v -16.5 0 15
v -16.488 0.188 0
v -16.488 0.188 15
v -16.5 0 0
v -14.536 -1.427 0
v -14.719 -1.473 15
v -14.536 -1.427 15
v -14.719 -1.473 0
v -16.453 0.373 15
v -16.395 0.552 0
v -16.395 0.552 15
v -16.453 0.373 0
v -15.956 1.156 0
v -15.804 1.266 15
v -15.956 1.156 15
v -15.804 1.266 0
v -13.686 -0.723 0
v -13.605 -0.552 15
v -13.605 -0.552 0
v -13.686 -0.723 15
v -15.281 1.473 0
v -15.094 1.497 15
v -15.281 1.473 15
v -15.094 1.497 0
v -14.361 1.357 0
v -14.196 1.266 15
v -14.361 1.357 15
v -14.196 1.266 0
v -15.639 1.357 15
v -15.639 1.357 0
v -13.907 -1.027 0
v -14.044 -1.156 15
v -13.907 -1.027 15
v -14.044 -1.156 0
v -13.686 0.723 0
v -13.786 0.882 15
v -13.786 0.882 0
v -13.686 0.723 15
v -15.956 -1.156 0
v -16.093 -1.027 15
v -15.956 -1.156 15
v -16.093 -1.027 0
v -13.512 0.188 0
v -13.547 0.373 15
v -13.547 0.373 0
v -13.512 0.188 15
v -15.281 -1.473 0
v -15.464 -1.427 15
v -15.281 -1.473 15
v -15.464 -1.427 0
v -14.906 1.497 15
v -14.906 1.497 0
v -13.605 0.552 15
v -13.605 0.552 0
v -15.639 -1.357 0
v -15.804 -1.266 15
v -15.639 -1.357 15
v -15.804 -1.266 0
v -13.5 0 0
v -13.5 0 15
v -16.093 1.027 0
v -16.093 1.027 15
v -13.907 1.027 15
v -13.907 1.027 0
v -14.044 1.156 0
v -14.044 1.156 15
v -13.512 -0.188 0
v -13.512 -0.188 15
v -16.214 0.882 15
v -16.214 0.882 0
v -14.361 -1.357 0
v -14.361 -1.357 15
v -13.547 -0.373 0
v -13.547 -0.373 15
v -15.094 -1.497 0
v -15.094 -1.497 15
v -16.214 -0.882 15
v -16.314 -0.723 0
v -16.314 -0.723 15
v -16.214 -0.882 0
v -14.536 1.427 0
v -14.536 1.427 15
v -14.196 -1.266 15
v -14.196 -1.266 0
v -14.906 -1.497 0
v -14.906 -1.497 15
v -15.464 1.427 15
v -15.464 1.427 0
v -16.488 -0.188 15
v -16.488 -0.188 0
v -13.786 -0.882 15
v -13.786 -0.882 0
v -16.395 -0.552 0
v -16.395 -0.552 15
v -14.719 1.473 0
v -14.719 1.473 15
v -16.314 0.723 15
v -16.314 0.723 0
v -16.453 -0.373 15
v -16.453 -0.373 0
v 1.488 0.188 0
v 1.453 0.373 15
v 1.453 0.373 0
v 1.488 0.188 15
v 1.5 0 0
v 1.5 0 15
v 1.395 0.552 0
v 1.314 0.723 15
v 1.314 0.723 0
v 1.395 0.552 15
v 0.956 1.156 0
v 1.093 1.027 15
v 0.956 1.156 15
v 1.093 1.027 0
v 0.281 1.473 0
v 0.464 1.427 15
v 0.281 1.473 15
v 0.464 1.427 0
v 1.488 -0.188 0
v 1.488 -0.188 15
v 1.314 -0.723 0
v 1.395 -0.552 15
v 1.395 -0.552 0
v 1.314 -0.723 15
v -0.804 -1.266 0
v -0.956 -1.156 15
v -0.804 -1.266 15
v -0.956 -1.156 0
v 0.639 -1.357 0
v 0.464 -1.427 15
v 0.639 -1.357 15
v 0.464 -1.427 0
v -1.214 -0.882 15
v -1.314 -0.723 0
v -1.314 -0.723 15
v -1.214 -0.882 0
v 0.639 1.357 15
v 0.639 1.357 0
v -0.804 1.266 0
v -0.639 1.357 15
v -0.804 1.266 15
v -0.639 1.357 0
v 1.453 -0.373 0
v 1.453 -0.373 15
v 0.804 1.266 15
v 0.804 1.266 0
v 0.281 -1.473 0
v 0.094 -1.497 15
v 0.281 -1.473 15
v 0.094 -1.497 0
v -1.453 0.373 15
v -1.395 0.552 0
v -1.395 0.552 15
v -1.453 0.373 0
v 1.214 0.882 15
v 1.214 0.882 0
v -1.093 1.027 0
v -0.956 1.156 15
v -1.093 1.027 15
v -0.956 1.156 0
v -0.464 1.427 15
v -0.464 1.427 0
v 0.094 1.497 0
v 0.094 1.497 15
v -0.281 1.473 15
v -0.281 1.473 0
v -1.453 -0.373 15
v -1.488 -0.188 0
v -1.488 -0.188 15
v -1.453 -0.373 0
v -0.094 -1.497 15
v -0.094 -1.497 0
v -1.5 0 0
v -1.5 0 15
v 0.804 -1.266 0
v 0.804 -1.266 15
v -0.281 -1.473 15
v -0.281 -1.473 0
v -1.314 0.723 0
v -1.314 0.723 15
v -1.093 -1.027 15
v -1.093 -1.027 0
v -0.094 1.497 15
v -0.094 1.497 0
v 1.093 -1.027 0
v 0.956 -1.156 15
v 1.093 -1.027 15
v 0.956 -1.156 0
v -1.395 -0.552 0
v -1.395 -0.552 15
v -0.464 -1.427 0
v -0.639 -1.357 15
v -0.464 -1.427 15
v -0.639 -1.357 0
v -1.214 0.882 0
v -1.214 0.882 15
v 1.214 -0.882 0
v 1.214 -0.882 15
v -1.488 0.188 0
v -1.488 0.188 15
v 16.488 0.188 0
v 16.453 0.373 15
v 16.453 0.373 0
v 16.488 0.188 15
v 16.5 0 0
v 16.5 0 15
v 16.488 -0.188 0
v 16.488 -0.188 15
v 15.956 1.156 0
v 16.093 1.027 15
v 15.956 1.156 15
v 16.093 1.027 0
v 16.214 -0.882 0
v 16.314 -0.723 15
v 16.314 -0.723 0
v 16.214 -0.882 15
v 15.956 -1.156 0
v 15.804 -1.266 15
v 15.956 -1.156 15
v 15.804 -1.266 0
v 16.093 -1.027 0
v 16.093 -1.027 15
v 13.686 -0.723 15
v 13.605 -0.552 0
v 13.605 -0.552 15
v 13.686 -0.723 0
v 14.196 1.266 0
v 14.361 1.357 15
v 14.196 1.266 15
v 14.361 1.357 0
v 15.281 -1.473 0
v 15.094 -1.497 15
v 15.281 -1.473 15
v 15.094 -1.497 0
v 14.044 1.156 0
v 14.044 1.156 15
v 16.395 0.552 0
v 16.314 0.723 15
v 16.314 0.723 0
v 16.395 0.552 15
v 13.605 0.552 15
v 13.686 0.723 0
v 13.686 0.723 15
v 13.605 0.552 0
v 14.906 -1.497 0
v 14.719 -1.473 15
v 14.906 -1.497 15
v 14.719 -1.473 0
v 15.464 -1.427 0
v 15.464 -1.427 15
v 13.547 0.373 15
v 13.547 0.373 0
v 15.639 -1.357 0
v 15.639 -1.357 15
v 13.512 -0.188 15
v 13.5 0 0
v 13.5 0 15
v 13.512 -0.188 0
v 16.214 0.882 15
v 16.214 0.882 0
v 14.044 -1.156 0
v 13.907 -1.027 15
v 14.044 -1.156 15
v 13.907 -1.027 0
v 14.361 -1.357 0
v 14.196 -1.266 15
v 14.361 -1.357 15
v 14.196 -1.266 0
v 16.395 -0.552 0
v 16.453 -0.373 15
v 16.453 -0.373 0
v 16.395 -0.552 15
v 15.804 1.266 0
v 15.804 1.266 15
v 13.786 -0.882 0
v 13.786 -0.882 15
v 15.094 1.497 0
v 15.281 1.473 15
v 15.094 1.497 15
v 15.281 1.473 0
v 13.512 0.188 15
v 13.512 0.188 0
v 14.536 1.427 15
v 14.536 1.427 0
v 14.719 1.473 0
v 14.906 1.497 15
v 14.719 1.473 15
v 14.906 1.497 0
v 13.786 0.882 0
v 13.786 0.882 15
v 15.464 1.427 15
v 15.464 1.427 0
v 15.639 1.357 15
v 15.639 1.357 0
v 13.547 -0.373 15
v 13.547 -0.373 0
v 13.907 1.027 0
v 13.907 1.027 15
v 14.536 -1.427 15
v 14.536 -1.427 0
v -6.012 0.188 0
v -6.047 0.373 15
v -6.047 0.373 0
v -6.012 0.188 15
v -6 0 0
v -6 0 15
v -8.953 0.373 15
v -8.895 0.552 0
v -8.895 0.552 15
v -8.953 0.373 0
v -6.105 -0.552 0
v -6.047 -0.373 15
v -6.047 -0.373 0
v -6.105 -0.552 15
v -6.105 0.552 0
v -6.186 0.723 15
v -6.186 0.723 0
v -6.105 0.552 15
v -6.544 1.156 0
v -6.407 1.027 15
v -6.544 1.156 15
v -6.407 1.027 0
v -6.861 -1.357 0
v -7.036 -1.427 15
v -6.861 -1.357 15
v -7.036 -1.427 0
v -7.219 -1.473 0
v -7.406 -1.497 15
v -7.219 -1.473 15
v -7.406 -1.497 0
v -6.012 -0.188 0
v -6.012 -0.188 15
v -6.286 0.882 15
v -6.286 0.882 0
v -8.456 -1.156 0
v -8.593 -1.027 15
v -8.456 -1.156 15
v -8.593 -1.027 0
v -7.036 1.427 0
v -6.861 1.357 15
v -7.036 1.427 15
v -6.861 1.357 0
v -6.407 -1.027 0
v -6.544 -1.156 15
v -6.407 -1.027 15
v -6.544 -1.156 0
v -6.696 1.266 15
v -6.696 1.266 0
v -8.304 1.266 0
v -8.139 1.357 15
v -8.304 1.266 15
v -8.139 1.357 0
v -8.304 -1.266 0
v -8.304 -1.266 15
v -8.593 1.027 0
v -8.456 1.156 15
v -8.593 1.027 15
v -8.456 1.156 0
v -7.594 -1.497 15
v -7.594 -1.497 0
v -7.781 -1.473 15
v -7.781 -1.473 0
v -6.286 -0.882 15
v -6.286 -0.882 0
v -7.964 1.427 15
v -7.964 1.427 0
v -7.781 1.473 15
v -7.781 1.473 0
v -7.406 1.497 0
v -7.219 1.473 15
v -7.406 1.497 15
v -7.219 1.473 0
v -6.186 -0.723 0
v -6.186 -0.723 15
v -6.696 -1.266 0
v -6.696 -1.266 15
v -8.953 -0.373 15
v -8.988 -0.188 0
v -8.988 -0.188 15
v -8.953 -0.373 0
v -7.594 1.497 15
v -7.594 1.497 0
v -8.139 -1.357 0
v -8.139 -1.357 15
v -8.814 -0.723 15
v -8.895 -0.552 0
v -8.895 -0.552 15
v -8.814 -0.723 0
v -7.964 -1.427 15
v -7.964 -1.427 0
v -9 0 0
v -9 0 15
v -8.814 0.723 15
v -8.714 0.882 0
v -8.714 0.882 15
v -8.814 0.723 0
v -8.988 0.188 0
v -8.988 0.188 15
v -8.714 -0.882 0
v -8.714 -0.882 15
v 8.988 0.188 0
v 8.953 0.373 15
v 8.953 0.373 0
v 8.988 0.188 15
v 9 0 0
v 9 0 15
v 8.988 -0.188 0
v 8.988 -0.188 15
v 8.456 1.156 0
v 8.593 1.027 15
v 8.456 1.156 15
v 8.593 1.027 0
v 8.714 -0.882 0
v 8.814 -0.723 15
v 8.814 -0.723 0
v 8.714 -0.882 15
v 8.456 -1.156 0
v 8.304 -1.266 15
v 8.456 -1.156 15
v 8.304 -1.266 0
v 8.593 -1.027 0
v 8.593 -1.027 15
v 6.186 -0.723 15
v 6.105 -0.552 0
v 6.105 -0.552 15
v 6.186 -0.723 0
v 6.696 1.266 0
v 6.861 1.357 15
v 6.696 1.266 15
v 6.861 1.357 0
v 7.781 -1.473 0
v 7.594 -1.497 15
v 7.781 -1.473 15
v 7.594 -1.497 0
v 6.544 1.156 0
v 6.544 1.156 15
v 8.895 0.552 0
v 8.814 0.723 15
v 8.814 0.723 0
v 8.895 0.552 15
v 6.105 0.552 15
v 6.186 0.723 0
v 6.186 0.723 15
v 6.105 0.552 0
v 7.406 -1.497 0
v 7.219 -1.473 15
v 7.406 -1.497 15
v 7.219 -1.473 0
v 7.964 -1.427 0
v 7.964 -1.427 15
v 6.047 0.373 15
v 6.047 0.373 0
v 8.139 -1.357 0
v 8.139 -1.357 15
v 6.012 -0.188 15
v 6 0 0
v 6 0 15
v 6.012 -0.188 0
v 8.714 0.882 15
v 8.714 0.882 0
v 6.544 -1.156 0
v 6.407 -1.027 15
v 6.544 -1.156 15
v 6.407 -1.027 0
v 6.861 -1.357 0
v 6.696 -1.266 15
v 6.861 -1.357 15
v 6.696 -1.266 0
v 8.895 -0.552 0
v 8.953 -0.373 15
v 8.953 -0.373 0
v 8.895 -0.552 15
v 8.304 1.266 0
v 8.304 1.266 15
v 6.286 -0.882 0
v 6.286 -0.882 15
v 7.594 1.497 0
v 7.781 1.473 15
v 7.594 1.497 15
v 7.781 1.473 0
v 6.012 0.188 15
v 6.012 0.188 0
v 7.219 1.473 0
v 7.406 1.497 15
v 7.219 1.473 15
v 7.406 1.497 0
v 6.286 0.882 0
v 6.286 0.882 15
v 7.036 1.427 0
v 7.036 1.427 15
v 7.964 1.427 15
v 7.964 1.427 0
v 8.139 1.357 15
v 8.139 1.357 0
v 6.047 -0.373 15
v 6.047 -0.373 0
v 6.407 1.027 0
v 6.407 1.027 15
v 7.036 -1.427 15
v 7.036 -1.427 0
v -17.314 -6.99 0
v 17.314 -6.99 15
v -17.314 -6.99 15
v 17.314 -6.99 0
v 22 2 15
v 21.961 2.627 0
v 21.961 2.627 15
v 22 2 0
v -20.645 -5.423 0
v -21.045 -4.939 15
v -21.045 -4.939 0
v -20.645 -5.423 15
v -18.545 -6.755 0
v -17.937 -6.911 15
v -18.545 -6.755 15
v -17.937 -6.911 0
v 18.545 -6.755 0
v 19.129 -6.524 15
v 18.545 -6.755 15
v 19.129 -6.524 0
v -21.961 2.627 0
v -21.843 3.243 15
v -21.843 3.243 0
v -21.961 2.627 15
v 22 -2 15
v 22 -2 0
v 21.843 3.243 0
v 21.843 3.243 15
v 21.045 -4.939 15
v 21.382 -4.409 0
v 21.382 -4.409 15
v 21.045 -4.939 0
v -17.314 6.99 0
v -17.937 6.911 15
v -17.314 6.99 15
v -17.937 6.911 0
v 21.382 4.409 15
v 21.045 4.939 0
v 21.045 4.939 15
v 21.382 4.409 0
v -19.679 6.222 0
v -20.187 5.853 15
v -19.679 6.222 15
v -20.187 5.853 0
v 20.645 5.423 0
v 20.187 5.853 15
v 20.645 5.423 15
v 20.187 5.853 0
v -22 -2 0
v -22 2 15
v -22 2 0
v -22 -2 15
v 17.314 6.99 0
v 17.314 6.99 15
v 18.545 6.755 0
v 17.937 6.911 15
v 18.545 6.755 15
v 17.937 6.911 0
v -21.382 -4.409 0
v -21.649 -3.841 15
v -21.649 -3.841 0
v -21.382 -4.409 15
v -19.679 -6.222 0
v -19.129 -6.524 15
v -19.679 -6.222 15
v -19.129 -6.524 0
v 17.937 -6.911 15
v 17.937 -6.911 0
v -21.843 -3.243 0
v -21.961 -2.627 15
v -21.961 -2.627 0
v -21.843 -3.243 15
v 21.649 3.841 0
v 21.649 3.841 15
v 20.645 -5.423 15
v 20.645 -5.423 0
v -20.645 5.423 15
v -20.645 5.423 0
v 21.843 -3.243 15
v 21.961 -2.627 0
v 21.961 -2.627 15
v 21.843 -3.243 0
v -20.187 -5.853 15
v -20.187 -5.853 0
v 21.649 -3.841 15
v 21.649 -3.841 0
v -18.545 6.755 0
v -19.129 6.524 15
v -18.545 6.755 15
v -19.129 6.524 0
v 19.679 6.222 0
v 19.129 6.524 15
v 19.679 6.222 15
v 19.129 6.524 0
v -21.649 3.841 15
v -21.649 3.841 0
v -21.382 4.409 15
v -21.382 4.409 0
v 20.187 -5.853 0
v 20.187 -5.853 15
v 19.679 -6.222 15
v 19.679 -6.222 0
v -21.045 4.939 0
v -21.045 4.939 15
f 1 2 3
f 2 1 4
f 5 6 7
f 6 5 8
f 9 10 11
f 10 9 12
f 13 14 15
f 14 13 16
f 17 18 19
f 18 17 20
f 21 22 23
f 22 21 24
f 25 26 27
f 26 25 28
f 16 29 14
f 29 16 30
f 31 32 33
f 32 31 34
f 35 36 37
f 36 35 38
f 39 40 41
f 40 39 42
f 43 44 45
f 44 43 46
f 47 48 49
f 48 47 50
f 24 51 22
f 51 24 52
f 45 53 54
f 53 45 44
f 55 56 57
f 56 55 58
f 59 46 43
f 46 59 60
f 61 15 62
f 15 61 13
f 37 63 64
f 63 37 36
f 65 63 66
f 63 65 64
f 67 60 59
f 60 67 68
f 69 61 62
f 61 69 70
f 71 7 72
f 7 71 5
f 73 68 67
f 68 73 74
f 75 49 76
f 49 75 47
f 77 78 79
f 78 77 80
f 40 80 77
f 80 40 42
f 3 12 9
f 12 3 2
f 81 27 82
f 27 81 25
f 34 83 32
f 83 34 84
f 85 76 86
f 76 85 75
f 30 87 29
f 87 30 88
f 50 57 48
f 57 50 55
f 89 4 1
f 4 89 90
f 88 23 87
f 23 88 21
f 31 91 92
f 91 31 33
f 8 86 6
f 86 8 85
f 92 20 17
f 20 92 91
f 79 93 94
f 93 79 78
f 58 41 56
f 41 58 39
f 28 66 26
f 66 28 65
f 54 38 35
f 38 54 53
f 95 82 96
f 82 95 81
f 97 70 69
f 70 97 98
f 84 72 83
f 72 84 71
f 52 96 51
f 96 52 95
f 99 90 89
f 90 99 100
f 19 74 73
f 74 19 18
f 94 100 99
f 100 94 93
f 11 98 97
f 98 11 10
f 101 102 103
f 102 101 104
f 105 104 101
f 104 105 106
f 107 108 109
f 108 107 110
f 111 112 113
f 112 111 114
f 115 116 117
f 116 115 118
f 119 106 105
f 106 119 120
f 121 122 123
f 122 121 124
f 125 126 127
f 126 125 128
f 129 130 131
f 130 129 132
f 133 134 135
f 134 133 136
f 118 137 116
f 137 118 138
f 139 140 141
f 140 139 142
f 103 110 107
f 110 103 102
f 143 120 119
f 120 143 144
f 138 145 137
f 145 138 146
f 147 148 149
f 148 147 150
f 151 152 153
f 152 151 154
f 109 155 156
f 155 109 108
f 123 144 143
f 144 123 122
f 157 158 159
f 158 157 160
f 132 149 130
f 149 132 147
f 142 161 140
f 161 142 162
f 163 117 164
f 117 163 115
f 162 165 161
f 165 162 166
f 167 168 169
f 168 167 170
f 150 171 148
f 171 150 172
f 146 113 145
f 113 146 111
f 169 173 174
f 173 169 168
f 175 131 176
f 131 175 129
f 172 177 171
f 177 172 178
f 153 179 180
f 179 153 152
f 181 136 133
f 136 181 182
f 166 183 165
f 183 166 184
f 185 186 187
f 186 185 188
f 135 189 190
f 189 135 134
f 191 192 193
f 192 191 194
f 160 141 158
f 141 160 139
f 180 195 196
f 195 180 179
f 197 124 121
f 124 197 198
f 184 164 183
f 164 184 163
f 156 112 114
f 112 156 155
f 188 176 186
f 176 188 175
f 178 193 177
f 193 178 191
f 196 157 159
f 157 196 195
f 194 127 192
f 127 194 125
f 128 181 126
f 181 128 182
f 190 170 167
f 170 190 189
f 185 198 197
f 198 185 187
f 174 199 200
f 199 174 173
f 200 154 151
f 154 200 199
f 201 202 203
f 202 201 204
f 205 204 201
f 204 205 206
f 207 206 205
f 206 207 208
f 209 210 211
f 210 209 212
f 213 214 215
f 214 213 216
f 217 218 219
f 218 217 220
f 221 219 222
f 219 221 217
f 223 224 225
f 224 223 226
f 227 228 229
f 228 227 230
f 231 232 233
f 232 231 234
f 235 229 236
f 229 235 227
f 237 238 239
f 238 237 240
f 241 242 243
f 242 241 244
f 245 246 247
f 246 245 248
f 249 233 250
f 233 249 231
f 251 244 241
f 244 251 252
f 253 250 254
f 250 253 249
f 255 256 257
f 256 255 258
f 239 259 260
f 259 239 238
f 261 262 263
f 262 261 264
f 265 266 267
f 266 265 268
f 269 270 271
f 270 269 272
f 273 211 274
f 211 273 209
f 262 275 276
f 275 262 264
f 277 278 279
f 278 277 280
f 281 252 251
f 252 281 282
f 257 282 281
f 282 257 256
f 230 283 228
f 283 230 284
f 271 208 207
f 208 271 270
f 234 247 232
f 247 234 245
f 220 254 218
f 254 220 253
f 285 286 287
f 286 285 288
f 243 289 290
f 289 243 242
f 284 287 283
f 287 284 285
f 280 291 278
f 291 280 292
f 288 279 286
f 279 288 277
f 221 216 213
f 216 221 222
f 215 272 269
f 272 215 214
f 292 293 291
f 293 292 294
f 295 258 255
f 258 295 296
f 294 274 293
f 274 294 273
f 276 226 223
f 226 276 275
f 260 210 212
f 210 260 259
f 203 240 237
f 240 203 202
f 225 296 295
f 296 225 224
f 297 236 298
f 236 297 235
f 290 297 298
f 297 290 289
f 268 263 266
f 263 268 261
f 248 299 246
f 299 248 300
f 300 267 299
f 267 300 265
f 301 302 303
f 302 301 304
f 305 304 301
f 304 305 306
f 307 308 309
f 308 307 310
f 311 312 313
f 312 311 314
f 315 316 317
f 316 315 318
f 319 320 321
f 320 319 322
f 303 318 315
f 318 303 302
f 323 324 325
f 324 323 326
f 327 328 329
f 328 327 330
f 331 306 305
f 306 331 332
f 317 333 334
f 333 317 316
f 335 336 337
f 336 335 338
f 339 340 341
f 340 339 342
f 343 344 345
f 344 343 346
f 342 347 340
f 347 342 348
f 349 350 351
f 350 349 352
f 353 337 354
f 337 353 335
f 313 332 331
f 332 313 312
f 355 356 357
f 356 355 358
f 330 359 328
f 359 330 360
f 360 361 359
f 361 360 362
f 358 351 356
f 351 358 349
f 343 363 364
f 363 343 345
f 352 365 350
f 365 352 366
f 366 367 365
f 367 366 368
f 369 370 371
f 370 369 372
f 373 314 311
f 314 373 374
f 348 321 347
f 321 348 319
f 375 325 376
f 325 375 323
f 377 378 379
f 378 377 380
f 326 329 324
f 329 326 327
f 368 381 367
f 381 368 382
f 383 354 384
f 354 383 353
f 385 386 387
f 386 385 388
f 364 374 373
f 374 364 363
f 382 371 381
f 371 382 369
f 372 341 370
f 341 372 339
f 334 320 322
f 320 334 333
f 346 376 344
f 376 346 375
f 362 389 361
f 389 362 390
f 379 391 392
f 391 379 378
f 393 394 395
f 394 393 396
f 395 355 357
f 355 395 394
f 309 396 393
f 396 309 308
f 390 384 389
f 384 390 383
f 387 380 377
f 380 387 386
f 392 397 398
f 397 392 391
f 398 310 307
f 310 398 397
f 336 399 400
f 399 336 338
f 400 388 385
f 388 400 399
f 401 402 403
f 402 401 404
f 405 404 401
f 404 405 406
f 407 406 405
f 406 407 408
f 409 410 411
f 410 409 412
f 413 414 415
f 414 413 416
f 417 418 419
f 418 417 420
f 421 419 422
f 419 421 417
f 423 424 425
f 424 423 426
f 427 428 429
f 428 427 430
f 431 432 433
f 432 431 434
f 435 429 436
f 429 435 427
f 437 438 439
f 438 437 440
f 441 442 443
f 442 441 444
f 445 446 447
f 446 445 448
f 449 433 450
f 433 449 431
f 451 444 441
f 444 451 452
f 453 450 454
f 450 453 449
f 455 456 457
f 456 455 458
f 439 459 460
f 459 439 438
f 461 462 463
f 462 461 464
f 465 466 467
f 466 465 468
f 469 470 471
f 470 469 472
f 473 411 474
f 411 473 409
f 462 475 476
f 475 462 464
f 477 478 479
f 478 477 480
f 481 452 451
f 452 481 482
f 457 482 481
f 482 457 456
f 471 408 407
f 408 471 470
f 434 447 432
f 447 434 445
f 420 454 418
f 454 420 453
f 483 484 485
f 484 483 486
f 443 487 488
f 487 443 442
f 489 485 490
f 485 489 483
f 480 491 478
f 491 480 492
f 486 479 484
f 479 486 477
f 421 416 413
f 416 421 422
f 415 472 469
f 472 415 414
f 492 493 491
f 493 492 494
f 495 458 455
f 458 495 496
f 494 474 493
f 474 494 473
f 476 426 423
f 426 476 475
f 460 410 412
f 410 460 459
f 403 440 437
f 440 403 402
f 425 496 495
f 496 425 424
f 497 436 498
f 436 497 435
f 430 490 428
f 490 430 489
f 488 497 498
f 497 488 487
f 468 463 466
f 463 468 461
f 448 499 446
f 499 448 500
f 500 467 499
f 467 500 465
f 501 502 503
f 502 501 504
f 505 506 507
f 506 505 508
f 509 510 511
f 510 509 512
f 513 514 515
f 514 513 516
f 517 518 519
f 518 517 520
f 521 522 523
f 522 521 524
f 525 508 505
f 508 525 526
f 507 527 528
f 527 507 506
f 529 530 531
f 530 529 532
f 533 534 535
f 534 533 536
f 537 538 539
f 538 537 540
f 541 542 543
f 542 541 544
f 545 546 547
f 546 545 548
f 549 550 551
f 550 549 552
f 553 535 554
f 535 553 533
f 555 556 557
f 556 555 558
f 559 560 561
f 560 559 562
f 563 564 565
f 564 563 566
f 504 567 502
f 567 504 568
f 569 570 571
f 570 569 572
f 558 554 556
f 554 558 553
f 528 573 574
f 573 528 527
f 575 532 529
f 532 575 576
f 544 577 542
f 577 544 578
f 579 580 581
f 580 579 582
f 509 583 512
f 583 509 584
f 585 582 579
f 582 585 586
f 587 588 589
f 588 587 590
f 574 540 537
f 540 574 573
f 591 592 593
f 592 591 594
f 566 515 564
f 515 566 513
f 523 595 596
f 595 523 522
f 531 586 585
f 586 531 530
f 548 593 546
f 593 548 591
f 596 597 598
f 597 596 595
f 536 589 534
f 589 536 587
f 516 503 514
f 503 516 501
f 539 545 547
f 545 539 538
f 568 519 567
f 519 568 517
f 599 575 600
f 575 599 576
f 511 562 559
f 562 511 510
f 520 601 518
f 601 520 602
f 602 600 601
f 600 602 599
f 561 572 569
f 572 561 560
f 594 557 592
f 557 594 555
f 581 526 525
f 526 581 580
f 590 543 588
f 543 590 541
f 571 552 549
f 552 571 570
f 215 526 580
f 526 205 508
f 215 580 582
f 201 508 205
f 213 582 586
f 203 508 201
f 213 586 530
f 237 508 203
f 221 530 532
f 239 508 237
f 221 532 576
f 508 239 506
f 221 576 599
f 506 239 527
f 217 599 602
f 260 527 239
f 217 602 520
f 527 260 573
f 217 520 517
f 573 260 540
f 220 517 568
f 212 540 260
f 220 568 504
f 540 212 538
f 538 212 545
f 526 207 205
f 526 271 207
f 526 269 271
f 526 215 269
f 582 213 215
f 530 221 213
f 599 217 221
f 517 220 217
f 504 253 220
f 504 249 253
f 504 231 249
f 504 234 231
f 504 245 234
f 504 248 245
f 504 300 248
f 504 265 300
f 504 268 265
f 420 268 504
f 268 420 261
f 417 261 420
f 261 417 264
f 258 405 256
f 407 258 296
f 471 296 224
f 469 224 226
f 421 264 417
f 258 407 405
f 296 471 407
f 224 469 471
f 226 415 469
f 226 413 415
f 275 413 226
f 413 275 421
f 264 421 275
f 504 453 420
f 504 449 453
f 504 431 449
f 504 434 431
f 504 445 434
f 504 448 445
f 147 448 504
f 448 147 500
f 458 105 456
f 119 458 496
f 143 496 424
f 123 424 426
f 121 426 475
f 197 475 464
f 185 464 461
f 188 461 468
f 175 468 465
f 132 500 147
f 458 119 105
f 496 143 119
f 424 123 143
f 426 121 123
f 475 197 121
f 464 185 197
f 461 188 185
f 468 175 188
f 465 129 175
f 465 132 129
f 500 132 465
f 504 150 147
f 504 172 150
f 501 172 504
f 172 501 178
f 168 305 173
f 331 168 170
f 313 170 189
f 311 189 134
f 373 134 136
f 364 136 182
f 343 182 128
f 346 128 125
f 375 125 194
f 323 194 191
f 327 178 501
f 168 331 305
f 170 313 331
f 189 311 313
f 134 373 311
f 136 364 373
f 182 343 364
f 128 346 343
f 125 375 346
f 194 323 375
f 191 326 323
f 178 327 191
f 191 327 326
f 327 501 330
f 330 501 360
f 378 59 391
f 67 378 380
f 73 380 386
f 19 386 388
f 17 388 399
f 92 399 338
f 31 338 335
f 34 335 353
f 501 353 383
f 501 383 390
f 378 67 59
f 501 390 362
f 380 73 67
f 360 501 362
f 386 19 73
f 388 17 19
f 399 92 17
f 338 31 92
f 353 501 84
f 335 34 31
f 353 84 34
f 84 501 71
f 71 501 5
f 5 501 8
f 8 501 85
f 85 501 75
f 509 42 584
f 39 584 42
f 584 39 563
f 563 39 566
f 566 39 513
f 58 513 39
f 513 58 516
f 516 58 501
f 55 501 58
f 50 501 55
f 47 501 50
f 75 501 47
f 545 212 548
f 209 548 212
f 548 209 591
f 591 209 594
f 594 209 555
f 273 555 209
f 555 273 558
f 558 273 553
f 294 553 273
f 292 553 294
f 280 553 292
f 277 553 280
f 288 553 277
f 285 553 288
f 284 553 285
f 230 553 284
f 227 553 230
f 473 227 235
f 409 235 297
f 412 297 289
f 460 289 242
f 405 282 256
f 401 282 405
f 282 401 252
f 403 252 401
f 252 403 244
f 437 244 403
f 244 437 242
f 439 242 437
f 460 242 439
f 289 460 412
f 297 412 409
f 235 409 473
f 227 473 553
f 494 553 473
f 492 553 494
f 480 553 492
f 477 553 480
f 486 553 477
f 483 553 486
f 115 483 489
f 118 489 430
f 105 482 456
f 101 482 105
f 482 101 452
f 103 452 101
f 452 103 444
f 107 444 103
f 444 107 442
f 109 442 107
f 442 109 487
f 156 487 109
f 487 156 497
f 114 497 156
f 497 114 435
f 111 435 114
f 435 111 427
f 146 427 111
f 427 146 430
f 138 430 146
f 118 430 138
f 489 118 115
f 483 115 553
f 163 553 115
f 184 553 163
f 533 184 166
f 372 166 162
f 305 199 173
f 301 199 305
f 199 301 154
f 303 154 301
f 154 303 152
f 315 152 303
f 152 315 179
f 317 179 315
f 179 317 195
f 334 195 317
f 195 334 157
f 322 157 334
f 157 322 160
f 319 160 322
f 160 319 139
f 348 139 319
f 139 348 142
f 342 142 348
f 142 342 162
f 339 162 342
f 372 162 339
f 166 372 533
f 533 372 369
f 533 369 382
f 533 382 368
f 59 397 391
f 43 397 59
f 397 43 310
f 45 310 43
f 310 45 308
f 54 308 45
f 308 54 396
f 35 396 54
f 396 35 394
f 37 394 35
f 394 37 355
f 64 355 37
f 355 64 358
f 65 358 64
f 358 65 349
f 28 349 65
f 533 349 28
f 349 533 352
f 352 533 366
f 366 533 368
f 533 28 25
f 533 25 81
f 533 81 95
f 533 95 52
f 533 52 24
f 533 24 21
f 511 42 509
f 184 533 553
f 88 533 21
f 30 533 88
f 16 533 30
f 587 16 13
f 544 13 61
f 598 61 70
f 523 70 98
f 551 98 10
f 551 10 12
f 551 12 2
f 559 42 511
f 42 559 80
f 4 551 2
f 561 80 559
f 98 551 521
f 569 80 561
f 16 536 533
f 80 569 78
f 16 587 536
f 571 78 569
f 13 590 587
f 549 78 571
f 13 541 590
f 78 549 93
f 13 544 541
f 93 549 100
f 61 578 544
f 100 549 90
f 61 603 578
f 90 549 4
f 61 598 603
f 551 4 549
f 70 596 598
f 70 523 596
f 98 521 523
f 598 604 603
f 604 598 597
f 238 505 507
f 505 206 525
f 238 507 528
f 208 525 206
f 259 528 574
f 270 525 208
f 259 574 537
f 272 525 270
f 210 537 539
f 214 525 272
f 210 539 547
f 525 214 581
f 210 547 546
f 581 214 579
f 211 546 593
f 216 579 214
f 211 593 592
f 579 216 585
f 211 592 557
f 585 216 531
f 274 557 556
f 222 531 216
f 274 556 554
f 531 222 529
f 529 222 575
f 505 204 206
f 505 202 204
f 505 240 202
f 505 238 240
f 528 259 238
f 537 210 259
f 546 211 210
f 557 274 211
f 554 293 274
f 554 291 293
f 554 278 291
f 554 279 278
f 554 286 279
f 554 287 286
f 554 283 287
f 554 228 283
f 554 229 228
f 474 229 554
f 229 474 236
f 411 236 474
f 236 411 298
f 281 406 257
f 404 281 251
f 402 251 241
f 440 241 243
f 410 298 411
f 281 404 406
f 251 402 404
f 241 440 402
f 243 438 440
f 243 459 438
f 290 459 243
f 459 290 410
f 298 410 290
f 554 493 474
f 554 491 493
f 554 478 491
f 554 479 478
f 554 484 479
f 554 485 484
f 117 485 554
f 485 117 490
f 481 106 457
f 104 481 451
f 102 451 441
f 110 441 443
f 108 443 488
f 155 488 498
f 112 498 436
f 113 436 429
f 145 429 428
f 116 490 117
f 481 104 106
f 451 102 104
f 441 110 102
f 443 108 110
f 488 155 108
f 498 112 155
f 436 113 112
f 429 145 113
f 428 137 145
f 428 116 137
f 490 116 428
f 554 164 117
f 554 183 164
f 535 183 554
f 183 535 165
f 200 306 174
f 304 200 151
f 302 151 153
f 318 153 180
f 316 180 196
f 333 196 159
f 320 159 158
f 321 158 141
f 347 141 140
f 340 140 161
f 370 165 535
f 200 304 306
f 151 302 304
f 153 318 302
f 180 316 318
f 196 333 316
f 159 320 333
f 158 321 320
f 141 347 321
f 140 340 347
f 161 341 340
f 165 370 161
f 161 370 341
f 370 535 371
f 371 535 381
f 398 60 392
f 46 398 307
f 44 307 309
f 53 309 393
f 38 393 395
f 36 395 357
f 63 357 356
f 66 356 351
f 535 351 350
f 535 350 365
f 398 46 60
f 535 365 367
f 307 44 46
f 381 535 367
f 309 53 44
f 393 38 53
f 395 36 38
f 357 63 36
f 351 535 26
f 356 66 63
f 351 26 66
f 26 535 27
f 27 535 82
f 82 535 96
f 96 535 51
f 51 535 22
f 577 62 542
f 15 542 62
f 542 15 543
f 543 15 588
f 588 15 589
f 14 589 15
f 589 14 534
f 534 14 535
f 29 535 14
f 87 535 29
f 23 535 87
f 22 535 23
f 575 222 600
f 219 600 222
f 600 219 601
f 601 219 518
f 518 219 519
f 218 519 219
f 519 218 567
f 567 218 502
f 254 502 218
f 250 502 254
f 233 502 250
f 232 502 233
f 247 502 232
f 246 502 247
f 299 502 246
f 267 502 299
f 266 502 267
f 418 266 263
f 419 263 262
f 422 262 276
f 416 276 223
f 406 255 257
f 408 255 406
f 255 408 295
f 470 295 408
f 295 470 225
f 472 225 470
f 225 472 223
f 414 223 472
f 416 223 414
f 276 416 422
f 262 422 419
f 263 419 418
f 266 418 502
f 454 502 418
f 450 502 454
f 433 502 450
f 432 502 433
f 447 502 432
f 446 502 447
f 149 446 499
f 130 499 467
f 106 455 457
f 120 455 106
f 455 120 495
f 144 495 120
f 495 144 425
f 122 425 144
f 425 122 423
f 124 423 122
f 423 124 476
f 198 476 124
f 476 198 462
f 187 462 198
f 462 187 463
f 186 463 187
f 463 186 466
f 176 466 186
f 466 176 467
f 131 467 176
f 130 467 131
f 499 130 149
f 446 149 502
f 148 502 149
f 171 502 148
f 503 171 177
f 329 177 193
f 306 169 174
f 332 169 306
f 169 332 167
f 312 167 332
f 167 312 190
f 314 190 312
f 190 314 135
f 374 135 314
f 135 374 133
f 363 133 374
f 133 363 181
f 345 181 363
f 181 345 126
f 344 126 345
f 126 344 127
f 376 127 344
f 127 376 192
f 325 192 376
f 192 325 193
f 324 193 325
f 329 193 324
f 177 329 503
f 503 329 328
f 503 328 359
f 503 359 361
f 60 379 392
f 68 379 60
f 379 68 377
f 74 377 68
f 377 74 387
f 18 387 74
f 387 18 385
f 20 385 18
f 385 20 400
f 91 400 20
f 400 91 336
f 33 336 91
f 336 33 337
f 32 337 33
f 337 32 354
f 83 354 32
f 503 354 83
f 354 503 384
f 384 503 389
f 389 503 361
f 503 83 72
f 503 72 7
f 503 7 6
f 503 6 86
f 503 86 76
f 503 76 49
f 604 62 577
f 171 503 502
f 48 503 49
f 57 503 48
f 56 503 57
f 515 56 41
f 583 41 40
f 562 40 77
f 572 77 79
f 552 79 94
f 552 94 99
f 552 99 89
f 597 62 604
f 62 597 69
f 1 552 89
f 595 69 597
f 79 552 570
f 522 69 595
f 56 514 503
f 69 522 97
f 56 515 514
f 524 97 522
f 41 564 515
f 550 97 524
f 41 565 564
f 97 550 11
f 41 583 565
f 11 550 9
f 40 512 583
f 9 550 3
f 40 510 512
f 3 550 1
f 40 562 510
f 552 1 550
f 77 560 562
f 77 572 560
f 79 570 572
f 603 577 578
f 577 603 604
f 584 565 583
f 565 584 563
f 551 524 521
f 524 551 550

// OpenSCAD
$fn = 50;


difference() {
	union() {
		hull() {
			translate(v = [-17.0000000000, 2.0000000000, 0]) {
				cylinder(h = 15, r = 5);
			}
			translate(v = [17.0000000000, 2.0000000000, 0]) {
				cylinder(h = 15, r = 5);
			}
			translate(v = [-17.0000000000, -2.0000000000, 0]) {
				cylinder(h = 15, r = 5);
			}
			translate(v = [17.0000000000, -2.0000000000, 0]) {
				cylinder(h = 15, r = 5);
			}
		}
	}
	union() {
		translate(v = [-15.0000000000, 0.0000000000, 0]) {
			translate(v = [0, 0, -100]) {
				cylinder(h = 200, r = 1.5000000000);
			}
		}
		translate(v = [0, 0, -100]) {
			cylinder(h = 200, r = 1.5000000000);
		}
		translate(v = [15.0000000000, 0.0000000000, 0]) {
			translate(v = [0, 0, -100]) {
				cylinder(h = 200, r = 1.5000000000);
			}
		}
		translate(v = [-15.0000000000, 0.0000000000, 0]) {
			translate(v = [0, 0, -100]) {
				cylinder(h = 200, r = 1.5000000000);
			}
		}
		translate(v = [-7.5000000000, 0.0000000000, 0]) {
			translate(v = [0, 0, -100]) {
				cylinder(h = 200, r = 1.5000000000);
			}
		}
		translate(v = [0, 0, -100]) {
			cylinder(h = 200, r = 1.5000000000);
		}
		translate(v = [7.5000000000, 0.0000000000, 0]) {
			translate(v = [0, 0, -100]) {
				cylinder(h = 200, r = 1.5000000000);
			}
		}
		translate(v = [15.0000000000, 0.0000000000, 0]) {
			translate(v = [0, 0, -100]) {
				cylinder(h = 200, r = 1.5000000000);
			}
		}
	}
}
